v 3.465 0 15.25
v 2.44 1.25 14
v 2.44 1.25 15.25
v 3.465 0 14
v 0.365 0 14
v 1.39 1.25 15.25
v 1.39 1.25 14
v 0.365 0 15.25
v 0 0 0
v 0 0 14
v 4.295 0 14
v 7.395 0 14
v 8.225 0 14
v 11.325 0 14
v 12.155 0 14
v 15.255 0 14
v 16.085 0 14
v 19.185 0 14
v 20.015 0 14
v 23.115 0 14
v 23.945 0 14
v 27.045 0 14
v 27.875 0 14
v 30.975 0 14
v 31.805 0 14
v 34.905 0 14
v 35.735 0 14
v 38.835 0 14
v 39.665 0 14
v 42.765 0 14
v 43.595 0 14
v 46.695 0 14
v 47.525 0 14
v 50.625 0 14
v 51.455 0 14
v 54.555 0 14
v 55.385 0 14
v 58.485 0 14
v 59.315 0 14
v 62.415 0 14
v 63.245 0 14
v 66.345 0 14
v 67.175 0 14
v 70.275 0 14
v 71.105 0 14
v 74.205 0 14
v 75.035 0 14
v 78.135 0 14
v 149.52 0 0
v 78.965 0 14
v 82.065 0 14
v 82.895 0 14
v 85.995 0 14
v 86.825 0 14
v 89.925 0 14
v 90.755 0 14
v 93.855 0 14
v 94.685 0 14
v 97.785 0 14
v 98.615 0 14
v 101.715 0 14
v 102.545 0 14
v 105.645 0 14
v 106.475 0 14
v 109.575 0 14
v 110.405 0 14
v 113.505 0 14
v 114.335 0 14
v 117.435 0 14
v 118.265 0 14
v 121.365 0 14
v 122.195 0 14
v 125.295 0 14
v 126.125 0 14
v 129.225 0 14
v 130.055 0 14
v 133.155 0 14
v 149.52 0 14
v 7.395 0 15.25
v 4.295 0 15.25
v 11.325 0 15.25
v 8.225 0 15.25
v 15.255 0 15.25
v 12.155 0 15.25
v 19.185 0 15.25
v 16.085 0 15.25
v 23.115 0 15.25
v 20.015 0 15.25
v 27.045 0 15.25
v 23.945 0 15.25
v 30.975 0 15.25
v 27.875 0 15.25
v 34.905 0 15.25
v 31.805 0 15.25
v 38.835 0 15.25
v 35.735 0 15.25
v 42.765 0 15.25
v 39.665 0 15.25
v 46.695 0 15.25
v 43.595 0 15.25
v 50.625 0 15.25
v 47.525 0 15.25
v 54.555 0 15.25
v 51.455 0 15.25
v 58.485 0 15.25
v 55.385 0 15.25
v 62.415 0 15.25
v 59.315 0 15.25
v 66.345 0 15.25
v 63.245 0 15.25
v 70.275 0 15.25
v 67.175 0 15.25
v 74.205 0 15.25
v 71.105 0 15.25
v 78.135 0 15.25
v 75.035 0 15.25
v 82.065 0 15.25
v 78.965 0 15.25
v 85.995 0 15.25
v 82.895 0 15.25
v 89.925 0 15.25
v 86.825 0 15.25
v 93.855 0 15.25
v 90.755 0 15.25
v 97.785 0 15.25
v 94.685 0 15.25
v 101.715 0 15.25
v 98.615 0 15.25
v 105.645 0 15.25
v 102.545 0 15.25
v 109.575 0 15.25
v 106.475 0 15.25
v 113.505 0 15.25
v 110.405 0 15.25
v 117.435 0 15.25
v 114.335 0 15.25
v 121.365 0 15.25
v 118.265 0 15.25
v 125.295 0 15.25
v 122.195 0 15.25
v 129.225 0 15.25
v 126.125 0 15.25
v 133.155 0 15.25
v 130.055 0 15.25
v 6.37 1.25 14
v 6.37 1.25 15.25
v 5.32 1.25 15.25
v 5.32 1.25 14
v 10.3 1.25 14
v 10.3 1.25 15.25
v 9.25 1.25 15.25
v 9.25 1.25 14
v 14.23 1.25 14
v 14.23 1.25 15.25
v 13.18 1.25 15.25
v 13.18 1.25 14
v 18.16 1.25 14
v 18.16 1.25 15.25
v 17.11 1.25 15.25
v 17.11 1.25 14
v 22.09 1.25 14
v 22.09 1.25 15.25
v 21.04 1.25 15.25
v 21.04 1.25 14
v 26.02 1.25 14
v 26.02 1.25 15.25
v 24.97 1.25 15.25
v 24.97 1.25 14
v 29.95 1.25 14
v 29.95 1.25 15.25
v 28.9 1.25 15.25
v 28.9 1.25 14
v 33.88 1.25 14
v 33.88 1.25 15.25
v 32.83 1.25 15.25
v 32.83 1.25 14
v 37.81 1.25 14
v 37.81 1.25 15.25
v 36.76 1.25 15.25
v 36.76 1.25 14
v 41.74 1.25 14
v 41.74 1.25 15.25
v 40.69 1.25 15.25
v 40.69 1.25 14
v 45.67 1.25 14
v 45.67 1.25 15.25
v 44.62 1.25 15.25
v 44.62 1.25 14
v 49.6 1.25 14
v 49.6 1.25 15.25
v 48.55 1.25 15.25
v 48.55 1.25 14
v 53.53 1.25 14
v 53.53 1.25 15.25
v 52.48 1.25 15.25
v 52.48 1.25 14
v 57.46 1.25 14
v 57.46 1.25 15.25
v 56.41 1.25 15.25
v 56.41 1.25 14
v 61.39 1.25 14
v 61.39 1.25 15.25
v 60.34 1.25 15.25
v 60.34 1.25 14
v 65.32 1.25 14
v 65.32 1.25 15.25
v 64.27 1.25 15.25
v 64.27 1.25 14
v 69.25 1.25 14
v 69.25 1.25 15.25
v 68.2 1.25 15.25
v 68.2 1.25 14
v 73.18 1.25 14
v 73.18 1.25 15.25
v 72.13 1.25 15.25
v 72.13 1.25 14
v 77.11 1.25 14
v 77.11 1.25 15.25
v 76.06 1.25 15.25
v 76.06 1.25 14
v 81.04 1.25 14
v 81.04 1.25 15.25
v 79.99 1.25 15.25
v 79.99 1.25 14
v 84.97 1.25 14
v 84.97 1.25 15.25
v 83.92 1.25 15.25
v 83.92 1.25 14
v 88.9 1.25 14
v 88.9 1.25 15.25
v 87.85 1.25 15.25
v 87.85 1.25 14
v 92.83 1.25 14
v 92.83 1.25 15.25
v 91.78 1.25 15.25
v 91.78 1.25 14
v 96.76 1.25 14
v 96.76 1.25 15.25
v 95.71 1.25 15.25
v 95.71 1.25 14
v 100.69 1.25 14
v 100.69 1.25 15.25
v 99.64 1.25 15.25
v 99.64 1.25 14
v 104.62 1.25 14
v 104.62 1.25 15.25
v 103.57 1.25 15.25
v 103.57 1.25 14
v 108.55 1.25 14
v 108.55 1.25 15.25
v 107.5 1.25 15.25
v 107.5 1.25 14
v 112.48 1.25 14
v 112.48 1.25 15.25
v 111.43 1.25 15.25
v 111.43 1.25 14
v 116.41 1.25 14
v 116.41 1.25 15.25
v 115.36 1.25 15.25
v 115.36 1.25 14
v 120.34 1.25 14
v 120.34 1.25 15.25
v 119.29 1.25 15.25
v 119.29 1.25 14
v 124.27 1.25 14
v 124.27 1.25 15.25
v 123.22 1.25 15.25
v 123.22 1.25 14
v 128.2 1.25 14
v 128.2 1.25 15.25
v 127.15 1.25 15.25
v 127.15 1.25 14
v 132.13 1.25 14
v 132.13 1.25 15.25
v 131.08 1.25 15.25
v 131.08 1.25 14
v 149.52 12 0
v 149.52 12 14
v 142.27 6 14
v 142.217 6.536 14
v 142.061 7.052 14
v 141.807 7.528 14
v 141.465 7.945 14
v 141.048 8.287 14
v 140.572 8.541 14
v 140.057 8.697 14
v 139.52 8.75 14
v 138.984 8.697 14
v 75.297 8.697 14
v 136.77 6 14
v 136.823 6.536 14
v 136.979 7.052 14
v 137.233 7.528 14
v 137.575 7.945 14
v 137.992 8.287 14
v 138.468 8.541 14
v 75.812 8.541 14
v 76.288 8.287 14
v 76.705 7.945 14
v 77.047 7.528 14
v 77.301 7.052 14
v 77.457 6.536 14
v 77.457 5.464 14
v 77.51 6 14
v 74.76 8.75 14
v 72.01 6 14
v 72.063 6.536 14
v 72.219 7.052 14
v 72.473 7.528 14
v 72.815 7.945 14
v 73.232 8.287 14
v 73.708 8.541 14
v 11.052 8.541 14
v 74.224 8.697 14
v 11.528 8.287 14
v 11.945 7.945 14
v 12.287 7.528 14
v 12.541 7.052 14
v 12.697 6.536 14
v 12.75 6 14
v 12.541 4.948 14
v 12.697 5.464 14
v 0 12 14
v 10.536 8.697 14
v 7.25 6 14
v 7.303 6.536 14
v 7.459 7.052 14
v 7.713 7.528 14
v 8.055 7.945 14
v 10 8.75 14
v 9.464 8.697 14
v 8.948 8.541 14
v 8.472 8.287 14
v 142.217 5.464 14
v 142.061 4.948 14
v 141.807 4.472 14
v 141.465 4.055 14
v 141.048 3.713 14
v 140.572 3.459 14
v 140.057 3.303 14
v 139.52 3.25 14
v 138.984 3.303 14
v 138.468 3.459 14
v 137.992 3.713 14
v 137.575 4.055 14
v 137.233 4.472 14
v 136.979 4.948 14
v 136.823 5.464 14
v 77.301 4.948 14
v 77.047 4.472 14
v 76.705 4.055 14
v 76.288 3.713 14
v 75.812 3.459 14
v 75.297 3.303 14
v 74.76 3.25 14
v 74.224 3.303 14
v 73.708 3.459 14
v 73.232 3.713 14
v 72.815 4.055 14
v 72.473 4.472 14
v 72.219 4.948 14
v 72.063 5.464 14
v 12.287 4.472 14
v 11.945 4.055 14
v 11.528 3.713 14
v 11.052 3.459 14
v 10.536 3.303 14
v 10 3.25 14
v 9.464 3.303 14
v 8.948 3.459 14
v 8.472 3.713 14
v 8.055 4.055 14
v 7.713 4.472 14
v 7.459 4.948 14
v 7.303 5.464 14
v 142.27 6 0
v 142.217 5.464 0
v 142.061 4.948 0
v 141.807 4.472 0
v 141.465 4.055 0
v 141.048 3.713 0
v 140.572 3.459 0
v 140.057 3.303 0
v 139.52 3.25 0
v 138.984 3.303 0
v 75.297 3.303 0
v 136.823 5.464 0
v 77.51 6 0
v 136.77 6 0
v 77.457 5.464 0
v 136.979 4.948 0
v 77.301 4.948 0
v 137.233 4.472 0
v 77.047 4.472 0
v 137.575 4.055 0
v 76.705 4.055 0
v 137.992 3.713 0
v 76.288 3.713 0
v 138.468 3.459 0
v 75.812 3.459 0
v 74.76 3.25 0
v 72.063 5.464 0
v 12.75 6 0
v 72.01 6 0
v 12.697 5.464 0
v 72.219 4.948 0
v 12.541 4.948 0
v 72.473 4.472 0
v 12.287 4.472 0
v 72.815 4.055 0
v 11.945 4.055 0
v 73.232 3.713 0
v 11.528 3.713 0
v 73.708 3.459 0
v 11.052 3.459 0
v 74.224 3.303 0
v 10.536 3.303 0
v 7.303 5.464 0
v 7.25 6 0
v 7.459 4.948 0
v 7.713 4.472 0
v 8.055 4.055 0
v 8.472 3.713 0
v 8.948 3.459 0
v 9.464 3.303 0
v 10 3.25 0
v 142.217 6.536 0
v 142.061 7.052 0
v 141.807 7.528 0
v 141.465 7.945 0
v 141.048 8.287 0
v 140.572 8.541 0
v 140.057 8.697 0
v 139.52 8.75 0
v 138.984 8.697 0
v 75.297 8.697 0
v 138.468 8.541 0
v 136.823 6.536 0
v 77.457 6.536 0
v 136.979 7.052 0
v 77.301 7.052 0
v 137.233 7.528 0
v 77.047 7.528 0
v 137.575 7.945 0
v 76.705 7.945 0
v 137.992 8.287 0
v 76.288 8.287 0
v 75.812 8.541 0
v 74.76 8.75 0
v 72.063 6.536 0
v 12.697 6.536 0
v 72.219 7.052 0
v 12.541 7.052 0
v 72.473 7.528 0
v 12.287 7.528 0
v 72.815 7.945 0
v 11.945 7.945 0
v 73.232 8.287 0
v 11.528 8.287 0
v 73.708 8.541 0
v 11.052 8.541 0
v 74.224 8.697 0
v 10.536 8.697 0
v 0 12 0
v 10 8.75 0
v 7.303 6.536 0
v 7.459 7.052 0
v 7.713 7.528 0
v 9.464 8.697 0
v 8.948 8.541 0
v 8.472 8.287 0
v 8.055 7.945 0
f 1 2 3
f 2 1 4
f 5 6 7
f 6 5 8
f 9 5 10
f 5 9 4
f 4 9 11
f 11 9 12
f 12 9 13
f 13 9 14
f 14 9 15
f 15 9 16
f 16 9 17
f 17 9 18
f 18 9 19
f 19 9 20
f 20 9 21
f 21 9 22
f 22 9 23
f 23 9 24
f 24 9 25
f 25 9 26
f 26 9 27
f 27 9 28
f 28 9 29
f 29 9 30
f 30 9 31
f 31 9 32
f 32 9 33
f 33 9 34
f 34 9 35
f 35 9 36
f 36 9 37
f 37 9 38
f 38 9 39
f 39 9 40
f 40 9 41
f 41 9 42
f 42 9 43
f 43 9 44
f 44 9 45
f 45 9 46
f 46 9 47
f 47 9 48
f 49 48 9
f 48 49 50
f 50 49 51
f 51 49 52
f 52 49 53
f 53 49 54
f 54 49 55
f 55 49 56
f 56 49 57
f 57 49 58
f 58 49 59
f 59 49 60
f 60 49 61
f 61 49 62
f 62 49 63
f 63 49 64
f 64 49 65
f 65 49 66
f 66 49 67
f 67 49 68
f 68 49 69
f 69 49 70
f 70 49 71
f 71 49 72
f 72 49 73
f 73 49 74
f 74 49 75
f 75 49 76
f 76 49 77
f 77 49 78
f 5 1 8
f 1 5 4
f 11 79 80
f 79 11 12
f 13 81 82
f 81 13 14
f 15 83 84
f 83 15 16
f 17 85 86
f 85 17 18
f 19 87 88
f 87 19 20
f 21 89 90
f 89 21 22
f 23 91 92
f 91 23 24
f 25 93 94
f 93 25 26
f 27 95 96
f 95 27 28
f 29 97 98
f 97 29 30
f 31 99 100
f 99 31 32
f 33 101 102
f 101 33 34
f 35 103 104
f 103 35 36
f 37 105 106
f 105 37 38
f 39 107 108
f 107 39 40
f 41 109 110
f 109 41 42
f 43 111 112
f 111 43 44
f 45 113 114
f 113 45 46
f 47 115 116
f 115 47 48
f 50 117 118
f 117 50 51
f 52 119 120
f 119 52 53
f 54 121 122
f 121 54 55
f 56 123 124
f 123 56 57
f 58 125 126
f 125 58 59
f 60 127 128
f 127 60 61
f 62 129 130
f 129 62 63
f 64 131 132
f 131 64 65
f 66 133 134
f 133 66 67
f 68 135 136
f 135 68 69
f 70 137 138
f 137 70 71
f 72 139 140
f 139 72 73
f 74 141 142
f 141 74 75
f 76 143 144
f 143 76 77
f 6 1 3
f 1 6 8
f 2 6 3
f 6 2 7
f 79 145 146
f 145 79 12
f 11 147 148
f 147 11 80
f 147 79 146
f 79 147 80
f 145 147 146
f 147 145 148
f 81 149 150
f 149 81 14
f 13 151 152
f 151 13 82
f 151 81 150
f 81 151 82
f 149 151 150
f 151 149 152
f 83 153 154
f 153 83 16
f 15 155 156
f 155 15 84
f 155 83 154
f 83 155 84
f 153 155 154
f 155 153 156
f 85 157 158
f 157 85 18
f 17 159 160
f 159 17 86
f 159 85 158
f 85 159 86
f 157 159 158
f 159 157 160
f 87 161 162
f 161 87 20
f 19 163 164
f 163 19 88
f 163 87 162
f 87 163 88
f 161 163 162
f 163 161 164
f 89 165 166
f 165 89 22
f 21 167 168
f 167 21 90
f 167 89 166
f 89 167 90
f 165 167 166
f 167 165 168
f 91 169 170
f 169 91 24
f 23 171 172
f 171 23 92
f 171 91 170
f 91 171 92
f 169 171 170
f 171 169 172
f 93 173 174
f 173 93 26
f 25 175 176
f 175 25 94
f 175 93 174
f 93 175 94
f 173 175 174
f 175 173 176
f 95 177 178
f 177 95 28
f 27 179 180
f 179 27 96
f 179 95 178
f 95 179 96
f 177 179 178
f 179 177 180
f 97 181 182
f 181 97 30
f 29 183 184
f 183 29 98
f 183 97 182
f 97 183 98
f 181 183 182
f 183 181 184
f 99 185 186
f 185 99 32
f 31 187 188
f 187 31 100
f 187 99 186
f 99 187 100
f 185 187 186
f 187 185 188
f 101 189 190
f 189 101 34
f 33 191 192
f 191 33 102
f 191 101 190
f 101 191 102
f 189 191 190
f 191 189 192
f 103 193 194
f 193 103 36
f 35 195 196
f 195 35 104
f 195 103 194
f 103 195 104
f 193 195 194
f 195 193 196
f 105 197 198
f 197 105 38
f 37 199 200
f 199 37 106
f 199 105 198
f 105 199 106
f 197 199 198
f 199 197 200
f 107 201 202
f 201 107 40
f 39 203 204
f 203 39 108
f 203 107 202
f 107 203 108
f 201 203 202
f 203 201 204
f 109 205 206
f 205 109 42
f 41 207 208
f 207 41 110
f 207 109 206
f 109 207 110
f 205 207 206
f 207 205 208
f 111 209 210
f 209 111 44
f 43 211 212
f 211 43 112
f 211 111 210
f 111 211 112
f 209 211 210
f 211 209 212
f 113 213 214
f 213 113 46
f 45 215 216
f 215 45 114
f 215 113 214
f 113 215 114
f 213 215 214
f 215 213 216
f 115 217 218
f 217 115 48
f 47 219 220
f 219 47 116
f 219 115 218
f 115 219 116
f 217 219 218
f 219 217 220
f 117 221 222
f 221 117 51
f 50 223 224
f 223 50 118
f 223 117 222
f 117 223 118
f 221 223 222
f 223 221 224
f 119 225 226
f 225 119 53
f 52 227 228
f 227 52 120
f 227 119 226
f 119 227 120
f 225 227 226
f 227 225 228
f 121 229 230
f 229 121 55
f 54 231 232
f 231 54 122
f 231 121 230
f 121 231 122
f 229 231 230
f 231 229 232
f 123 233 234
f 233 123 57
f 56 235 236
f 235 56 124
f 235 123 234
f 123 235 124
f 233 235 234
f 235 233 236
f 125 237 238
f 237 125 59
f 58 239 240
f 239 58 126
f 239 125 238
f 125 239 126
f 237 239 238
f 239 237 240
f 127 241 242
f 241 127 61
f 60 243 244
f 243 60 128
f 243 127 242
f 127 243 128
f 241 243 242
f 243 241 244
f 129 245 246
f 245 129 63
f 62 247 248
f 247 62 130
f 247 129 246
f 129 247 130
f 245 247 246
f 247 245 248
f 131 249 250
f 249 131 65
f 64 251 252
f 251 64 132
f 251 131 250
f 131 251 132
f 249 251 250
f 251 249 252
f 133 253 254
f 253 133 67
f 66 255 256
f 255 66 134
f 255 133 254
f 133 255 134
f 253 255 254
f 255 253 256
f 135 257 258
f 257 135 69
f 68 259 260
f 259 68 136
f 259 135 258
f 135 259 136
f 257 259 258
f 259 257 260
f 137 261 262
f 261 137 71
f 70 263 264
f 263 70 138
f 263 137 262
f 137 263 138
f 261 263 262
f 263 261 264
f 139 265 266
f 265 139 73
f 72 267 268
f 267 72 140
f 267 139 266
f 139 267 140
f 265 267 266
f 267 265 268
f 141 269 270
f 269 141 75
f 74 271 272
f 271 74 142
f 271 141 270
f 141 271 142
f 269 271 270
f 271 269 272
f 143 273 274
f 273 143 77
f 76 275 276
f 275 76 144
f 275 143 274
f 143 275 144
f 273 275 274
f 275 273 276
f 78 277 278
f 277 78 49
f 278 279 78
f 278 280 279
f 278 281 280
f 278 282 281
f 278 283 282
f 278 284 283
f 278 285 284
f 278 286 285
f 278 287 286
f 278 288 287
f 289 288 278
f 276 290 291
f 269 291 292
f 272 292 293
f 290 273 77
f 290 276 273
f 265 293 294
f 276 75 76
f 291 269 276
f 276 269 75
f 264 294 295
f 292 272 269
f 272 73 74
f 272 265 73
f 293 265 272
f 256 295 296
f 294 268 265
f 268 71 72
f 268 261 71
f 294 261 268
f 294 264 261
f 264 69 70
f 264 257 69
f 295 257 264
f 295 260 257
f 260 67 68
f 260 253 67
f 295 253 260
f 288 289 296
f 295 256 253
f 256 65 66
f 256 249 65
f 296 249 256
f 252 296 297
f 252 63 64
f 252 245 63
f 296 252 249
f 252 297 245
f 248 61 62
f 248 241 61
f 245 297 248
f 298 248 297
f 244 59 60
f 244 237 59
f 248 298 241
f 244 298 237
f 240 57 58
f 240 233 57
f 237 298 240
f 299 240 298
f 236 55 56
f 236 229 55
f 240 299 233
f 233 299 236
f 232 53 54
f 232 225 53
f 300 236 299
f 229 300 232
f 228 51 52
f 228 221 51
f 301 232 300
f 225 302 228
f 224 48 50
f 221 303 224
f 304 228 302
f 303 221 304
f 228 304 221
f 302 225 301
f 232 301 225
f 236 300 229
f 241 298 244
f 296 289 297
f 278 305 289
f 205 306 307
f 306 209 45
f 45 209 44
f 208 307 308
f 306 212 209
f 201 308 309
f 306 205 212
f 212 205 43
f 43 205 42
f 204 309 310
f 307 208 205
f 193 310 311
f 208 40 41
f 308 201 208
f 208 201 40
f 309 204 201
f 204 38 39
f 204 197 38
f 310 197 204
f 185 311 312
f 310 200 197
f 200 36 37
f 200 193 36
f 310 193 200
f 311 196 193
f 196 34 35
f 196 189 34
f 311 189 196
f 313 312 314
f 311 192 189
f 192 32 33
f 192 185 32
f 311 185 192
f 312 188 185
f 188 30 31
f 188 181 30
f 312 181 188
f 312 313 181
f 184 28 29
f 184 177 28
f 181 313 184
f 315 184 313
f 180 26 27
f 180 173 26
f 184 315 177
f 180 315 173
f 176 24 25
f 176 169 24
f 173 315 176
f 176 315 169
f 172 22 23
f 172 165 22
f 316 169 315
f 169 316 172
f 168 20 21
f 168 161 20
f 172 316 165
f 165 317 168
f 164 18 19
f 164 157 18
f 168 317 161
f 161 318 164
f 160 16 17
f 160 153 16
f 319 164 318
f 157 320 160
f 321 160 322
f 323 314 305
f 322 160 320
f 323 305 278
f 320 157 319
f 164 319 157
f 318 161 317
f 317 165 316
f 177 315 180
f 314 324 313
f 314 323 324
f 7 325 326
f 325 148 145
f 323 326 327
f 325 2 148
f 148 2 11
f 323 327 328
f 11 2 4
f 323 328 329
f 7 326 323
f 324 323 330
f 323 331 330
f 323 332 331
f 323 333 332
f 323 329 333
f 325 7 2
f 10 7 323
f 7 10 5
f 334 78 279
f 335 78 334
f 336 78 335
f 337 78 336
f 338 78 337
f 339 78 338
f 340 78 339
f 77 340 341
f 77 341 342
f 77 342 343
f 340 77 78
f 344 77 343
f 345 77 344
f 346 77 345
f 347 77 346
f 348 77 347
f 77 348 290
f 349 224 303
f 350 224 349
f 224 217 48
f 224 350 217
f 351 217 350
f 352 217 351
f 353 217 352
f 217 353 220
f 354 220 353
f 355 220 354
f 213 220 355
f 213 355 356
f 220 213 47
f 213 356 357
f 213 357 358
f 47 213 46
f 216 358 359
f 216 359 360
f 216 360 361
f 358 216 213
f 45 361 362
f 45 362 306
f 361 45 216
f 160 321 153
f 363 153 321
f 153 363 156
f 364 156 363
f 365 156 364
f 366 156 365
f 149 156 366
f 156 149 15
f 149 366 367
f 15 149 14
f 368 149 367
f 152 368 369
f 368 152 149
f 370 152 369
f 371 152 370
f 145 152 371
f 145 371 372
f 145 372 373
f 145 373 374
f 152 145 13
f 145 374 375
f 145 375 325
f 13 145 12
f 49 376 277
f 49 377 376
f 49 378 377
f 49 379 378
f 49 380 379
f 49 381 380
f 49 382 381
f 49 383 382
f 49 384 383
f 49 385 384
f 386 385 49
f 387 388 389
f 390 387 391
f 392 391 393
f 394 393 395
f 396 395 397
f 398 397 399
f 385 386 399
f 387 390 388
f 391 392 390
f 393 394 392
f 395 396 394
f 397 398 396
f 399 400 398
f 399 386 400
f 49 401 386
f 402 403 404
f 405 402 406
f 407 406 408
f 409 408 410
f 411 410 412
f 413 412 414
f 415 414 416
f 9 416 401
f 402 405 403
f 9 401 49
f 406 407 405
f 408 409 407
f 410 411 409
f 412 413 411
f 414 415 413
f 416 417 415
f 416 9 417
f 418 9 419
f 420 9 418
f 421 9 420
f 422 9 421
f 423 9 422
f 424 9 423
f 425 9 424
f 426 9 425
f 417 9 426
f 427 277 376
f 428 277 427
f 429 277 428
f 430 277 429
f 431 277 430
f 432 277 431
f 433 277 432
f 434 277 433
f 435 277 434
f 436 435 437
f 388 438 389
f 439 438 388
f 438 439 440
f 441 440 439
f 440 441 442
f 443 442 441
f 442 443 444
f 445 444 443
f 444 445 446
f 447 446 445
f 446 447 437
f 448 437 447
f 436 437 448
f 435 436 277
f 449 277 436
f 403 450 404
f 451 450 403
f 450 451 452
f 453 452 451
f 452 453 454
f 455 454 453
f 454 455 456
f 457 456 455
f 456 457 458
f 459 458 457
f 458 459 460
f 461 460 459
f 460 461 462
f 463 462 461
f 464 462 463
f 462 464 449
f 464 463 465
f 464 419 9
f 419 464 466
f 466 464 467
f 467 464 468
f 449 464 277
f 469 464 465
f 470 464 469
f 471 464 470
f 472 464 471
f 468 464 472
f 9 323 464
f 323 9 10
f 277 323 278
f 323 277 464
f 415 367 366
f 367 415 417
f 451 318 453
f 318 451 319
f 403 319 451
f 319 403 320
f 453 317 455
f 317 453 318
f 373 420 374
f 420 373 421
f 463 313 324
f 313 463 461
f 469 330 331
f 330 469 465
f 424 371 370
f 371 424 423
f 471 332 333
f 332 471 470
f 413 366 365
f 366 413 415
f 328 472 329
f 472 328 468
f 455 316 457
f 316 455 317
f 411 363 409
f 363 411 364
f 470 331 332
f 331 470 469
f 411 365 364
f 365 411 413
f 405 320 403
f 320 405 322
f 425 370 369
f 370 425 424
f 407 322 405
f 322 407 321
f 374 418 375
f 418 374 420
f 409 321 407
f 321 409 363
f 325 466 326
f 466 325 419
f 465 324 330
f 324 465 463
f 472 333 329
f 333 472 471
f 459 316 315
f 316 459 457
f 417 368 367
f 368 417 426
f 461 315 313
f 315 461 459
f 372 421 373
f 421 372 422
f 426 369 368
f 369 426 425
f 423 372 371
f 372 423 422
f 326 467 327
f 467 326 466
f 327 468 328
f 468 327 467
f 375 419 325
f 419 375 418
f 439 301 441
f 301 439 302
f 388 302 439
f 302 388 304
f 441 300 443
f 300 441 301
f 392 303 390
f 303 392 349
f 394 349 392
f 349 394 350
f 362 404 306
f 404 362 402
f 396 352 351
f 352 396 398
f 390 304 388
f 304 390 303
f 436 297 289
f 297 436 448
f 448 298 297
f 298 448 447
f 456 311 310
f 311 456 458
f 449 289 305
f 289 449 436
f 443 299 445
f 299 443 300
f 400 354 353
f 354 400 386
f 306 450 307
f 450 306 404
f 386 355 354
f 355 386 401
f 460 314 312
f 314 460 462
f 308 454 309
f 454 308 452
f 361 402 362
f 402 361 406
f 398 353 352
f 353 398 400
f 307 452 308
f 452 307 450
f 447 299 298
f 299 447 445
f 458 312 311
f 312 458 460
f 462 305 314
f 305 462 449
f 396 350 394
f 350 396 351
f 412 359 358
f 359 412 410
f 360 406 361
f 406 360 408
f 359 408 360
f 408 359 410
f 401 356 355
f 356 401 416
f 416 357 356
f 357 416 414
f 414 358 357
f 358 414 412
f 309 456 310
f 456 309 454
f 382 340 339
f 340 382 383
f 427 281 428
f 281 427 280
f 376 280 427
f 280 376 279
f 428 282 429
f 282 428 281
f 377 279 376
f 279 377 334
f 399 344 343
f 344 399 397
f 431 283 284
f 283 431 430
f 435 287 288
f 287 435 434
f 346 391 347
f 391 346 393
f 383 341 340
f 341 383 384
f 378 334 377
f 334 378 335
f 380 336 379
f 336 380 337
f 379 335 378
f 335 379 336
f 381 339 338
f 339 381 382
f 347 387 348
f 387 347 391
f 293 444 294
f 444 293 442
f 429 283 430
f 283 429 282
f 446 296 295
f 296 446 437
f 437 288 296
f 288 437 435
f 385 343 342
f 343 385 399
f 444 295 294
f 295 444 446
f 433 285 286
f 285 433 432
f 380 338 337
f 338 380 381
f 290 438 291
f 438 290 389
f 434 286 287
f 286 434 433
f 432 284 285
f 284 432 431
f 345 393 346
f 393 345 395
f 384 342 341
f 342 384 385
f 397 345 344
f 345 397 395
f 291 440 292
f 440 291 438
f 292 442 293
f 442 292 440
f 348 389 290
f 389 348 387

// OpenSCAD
$fn = 32;

// ----------------------------------------------------------------------
// Gear rack: m=1.25 z=34, 149.52 x 12 x 15.25 mm
// ----------------------------------------------------------------------

// --- parameters (mm) ---
rack_len = 149.52;        // rack length, X
rack_w = 12;              // rack width, Y
rack_h = 15.25;           // overall height, Z
modul = 1.25;             // module
body_t = 14;              // tooth root line height
pitch = 3.93;             // circular pitch
tip_w = 1.05;             // tooth thickness at the tip
root_w = 3.1;             // tooth thickness at the root line
hole_d = 5.5;             // mounting hole
sink = 0.6;               // tooth root overlap into the body

tooth_span = 133.52;

module tooth(x0) {
  /* 20 deg flank profile, sunk into the body for a positive overlap */
  translate([x0, 0, body_t - sink])
    linear_extrude(height = rack_h - body_t + sink)
      polygon(points = [[-root_w / 2, 0], [root_w / 2, 0],
                        [tip_w / 2, rack_h - body_t],
                        [-tip_w / 2, rack_h - body_t]]);
}

difference() {
  union() {
    cube([rack_len, rack_w, body_t]);
    for (i = [0 : 34 - 1])
      tooth((i + 0.5) * pitch + (tooth_span - 34 * pitch) / 2);
  }
  translate([10, 6, -1]) cylinder(h = body_t + 2, d = hole_d);
  translate([74.76, 6, -1]) cylinder(h = body_t + 2, d = hole_d);
  translate([139.52, 6, -1]) cylinder(h = body_t + 2, d = hole_d);
}
